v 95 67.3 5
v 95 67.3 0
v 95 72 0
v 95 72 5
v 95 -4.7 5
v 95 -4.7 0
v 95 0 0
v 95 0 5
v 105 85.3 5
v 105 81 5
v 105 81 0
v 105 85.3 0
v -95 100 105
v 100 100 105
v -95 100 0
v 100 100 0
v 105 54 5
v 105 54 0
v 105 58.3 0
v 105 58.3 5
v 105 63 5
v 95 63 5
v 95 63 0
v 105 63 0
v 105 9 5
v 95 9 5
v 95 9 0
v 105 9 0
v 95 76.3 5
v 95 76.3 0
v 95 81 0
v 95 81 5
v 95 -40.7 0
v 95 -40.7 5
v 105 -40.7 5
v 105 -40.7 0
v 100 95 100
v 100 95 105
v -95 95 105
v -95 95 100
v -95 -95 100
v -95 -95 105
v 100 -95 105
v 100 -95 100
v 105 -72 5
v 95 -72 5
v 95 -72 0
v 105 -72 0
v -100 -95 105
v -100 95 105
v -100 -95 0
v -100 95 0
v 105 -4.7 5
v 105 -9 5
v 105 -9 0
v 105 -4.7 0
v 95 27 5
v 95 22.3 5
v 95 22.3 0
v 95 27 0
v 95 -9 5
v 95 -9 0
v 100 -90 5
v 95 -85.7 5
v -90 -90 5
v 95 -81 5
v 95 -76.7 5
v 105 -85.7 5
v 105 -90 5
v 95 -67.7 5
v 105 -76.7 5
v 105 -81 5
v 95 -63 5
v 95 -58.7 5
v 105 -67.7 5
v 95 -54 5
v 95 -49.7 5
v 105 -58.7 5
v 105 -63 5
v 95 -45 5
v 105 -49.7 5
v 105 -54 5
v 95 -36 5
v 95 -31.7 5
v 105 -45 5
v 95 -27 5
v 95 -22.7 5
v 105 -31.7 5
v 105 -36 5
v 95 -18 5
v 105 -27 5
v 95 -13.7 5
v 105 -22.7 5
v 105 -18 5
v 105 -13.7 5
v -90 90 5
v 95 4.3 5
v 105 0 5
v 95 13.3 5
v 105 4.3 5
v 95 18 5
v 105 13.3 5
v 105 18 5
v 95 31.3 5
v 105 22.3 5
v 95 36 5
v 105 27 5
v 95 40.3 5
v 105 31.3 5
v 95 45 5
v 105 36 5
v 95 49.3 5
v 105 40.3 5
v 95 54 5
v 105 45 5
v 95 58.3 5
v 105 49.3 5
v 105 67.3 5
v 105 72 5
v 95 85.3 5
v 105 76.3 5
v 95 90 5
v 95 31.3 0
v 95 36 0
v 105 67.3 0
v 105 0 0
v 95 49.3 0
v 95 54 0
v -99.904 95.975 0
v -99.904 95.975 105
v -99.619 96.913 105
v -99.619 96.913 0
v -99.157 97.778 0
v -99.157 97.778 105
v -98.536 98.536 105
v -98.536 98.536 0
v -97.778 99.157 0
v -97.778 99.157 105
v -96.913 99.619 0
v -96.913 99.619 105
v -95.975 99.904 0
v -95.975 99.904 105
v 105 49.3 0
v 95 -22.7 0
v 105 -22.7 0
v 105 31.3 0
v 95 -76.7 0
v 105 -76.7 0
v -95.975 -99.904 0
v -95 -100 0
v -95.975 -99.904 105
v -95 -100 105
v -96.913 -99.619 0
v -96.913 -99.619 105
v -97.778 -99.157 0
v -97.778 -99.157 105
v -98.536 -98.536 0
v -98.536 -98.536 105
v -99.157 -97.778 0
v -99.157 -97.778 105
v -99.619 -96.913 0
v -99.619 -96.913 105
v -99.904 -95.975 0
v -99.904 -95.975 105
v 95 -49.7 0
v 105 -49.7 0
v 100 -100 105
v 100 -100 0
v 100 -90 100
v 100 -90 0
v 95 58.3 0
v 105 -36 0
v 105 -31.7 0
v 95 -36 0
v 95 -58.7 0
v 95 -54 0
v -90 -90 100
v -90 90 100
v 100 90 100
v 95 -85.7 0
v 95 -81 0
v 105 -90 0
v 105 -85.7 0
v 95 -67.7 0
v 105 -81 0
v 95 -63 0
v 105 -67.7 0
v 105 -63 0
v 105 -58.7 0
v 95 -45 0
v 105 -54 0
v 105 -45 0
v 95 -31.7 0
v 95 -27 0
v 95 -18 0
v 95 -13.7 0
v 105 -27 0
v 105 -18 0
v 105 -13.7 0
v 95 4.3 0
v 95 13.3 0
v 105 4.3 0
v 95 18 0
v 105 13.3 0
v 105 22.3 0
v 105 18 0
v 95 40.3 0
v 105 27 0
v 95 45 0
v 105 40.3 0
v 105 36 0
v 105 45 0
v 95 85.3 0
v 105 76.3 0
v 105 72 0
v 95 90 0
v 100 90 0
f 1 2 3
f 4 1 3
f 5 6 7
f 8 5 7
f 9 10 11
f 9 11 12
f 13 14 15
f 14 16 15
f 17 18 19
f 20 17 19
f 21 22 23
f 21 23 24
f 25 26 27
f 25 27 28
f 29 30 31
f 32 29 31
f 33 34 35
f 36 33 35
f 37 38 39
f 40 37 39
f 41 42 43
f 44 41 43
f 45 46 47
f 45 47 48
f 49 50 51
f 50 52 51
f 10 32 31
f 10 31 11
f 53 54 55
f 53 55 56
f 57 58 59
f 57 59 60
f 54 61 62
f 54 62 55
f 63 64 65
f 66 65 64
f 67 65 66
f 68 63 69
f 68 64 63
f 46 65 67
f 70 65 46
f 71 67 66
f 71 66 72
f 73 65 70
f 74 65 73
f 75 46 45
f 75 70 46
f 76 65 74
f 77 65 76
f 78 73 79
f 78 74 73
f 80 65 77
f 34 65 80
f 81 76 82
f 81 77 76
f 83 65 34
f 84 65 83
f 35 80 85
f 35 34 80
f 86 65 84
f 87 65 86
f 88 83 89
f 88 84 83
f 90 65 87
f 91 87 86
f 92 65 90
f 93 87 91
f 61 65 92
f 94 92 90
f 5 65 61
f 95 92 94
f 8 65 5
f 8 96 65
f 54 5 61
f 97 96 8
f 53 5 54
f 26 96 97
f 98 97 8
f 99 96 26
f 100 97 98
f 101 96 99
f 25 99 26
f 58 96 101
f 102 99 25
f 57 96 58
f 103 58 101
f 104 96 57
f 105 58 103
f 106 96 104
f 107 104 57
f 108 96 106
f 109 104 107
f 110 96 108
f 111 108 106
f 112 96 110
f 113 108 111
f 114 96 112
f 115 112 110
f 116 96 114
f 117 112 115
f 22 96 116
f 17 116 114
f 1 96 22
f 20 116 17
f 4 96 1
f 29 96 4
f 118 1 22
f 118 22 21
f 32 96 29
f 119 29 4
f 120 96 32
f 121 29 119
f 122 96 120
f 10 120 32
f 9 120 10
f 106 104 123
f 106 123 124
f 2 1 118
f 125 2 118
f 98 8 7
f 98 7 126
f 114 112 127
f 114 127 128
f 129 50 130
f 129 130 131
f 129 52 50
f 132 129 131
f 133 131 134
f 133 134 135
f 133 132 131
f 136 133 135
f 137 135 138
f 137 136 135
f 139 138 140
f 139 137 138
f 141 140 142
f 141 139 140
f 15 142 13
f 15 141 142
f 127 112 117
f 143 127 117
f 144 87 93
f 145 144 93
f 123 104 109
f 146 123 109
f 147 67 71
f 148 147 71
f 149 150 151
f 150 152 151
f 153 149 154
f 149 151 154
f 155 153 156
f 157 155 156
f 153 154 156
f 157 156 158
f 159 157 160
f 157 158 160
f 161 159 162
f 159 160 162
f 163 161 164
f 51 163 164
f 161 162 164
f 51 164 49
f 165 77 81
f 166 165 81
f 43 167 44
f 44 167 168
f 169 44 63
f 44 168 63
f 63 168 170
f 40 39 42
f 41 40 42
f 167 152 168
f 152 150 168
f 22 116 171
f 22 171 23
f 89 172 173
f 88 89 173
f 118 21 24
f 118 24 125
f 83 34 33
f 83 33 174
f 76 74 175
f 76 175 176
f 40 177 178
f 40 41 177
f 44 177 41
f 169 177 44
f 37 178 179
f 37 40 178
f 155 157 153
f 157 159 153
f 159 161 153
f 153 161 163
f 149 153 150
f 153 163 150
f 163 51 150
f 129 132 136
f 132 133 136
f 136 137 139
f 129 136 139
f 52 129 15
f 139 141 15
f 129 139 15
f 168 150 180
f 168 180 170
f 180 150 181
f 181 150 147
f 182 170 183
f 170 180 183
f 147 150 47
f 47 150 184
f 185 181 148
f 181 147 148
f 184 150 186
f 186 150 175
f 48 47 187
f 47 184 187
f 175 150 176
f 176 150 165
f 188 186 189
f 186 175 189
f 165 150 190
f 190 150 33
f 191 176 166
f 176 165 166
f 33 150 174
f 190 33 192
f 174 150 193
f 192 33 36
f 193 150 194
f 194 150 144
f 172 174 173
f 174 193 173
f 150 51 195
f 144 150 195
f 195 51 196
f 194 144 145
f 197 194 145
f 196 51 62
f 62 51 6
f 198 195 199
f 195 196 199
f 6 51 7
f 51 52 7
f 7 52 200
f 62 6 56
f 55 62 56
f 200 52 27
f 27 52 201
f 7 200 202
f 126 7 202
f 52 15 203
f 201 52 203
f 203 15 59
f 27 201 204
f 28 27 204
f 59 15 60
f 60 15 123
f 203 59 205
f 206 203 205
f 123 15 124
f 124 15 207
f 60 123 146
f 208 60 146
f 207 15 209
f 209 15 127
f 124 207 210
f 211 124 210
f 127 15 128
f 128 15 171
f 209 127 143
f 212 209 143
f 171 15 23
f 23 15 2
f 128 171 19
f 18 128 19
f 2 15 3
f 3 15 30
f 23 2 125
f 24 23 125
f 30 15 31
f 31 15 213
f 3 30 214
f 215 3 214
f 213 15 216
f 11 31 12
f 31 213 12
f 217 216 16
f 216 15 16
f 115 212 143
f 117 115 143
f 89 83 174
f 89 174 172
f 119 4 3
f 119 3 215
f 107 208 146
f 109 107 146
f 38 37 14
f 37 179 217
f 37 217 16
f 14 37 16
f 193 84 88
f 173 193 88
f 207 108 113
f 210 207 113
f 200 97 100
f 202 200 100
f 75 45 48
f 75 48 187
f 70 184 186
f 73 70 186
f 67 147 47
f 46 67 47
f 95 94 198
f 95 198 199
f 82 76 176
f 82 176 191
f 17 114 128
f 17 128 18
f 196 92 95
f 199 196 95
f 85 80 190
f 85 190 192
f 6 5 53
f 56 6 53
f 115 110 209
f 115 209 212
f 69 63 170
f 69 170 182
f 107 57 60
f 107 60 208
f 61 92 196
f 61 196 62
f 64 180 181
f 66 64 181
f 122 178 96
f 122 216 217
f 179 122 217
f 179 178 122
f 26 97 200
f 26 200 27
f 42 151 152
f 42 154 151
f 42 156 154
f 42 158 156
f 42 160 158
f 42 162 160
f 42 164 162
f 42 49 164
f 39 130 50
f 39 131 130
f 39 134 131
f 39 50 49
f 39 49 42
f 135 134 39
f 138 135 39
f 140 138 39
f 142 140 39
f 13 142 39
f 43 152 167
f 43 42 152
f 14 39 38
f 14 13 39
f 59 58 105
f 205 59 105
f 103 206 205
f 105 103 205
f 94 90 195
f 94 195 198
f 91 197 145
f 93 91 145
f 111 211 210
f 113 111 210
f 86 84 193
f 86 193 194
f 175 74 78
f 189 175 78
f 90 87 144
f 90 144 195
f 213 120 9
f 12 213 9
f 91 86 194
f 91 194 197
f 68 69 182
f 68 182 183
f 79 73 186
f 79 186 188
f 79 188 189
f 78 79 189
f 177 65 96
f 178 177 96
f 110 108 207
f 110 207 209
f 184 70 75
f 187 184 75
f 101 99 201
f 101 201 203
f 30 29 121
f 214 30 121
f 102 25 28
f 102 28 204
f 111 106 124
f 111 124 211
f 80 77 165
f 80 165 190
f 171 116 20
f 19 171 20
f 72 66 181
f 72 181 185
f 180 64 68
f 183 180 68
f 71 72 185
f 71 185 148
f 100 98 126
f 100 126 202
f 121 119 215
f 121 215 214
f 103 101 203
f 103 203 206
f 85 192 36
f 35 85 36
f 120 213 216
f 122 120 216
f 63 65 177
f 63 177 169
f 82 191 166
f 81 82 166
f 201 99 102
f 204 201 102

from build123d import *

# Parameters (mm, degrees)
F0_W     = 200
F0_H     = 200
F1_DEPTH = 5
F2_W     = 10
F2_H     = 10
F2_W_2   = 190
F2_H_2   = 180
F3_DEPTH = 100
F5_DEPTH = 5
F6_W     = 5
F6_H     = 4.7
F7_DEPTH = 25
F6_H_2   = 4.3
F8_DEPTH = 5
F9_R     = 5


with BuildPart() as f1:
    # F0 (on Top) → F1 (new body)
    with BuildSketch(Plane.XY):
        Rectangle(F0_W, F0_H)
    extrude(amount=F1_DEPTH)

    # F2 (on face) → F3 (join)
    with BuildSketch(Plane.XY.offset(5)):
        with Locations((-95, 95)):
            Rectangle(F2_W, F2_H)
        with Locations((5, 95)):
            Rectangle(F2_W_2, F2_H)
        with Locations((-95, 0)):
            Rectangle(F2_W, F2_H_2)
        with Locations((-95, -95)):
            Rectangle(F2_W, F2_H)
        with Locations((5, -95)):
            Rectangle(F2_W_2, F2_H)
    extrude(amount=F3_DEPTH)

    # F4 (on face) → F5 (cut)
    with BuildSketch(Plane.XY.offset(105)):
        Polygon((100, 90), (100, 95), (-95, 95), (-95, -95), (100, -95), (100, -90), (-90, -90), (-90, 90), align=None)
    extrude(amount=-F5_DEPTH, mode=Mode.SUBTRACT)

    # F6 (on face) → F7 (cut)
    with BuildSketch(Plane.XY.offset(5)):
        with Locations((97.5, -83.35)):
            Rectangle(F6_W, F6_H)
        with Locations((97.5, -74.35)):
            Rectangle(F6_W, F6_H)
        with Locations((97.5, -65.35)):
            Rectangle(F6_W, F6_H)
        with Locations((97.5, -56.35)):
            Rectangle(F6_W, F6_H)
        with Locations((97.5, -47.35)):
            Rectangle(F6_W, F6_H)
        with Locations((97.5, -38.35)):
            Rectangle(F6_W, F6_H)
        with Locations((97.5, -29.35)):
            Rectangle(F6_W, F6_H)
        with Locations((97.5, -20.35)):
            Rectangle(F6_W, F6_H)
        with Locations((97.5, -11.35)):
            Rectangle(F6_W, F6_H)
        with Locations((97.5, -2.35)):
            Rectangle(F6_W, F6_H)
        with Locations((97.5, 6.65)):
            Rectangle(F6_W, F6_H)
        with Locations((97.5, 15.65)):
            Rectangle(F6_W, F6_H)
        with Locations((97.5, 24.65)):
            Rectangle(F6_W, F6_H)
        with Locations((97.5, 33.65)):
            Rectangle(F6_W, F6_H)
        with Locations((97.5, 42.65)):
            Rectangle(F6_W, F6_H)
        with Locations((97.5, 51.65)):
            Rectangle(F6_W, F6_H)
        with Locations((97.5, 60.65)):
            Rectangle(F6_W, F6_H)
        with Locations((97.5, 69.65)):
            Rectangle(F6_W, F6_H)
        with Locations((97.5, 78.65)):
            Rectangle(F6_W, F6_H)
        with Locations((97.5, 87.65)):
            Rectangle(F6_W, F6_H)
    extrude(amount=-F7_DEPTH, mode=Mode.SUBTRACT)

    # F6 (on face) → F8 (join)
    with BuildSketch(Plane.XY.offset(5)):
        with Locations((102.5, -87.85)):
            Rectangle(F6_W, F6_H_2)
        with Locations((102.5, -78.85)):
            Rectangle(F6_W, F6_H_2)
        with Locations((102.5, -69.85)):
            Rectangle(F6_W, F6_H_2)
        with Locations((102.5, -60.85)):
            Rectangle(F6_W, F6_H_2)
        with Locations((102.5, -51.85)):
            Rectangle(F6_W, F6_H_2)
        with Locations((102.5, -42.85)):
            Rectangle(F6_W, F6_H_2)
        with Locations((102.5, -33.85)):
            Rectangle(F6_W, F6_H_2)
        with Locations((102.5, -24.85)):
            Rectangle(F6_W, F6_H_2)
        with Locations((102.5, -15.85)):
            Rectangle(F6_W, F6_H_2)
        with Locations((102.5, -6.85)):
            Rectangle(F6_W, F6_H_2)
        with Locations((102.5, 2.15)):
            Rectangle(F6_W, F6_H_2)
        with Locations((102.5, 11.15)):
            Rectangle(F6_W, F6_H_2)
        with Locations((102.5, 20.15)):
            Rectangle(F6_W, F6_H_2)
        with Locations((102.5, 29.15)):
            Rectangle(F6_W, F6_H_2)
        with Locations((102.5, 38.15)):
            Rectangle(F6_W, F6_H_2)
        with Locations((102.5, 47.15)):
            Rectangle(F6_W, F6_H_2)
        with Locations((102.5, 56.15)):
            Rectangle(F6_W, F6_H_2)
        with Locations((102.5, 65.15)):
            Rectangle(F6_W, F6_H_2)
        with Locations((102.5, 74.15)):
            Rectangle(F6_W, F6_H_2)
        with Locations((102.5, 83.15)):
            Rectangle(F6_W, F6_H_2)
    extrude(amount=-F8_DEPTH)

    # F9
    f9_edges = [f1.edges().sort_by_distance(p)[0] for p in [
        (-100, -100, 52.5),
        (-100, 100, 52.5),
    ]]
    fillet(f9_edges, radius=F9_R)


solid = f1.part
